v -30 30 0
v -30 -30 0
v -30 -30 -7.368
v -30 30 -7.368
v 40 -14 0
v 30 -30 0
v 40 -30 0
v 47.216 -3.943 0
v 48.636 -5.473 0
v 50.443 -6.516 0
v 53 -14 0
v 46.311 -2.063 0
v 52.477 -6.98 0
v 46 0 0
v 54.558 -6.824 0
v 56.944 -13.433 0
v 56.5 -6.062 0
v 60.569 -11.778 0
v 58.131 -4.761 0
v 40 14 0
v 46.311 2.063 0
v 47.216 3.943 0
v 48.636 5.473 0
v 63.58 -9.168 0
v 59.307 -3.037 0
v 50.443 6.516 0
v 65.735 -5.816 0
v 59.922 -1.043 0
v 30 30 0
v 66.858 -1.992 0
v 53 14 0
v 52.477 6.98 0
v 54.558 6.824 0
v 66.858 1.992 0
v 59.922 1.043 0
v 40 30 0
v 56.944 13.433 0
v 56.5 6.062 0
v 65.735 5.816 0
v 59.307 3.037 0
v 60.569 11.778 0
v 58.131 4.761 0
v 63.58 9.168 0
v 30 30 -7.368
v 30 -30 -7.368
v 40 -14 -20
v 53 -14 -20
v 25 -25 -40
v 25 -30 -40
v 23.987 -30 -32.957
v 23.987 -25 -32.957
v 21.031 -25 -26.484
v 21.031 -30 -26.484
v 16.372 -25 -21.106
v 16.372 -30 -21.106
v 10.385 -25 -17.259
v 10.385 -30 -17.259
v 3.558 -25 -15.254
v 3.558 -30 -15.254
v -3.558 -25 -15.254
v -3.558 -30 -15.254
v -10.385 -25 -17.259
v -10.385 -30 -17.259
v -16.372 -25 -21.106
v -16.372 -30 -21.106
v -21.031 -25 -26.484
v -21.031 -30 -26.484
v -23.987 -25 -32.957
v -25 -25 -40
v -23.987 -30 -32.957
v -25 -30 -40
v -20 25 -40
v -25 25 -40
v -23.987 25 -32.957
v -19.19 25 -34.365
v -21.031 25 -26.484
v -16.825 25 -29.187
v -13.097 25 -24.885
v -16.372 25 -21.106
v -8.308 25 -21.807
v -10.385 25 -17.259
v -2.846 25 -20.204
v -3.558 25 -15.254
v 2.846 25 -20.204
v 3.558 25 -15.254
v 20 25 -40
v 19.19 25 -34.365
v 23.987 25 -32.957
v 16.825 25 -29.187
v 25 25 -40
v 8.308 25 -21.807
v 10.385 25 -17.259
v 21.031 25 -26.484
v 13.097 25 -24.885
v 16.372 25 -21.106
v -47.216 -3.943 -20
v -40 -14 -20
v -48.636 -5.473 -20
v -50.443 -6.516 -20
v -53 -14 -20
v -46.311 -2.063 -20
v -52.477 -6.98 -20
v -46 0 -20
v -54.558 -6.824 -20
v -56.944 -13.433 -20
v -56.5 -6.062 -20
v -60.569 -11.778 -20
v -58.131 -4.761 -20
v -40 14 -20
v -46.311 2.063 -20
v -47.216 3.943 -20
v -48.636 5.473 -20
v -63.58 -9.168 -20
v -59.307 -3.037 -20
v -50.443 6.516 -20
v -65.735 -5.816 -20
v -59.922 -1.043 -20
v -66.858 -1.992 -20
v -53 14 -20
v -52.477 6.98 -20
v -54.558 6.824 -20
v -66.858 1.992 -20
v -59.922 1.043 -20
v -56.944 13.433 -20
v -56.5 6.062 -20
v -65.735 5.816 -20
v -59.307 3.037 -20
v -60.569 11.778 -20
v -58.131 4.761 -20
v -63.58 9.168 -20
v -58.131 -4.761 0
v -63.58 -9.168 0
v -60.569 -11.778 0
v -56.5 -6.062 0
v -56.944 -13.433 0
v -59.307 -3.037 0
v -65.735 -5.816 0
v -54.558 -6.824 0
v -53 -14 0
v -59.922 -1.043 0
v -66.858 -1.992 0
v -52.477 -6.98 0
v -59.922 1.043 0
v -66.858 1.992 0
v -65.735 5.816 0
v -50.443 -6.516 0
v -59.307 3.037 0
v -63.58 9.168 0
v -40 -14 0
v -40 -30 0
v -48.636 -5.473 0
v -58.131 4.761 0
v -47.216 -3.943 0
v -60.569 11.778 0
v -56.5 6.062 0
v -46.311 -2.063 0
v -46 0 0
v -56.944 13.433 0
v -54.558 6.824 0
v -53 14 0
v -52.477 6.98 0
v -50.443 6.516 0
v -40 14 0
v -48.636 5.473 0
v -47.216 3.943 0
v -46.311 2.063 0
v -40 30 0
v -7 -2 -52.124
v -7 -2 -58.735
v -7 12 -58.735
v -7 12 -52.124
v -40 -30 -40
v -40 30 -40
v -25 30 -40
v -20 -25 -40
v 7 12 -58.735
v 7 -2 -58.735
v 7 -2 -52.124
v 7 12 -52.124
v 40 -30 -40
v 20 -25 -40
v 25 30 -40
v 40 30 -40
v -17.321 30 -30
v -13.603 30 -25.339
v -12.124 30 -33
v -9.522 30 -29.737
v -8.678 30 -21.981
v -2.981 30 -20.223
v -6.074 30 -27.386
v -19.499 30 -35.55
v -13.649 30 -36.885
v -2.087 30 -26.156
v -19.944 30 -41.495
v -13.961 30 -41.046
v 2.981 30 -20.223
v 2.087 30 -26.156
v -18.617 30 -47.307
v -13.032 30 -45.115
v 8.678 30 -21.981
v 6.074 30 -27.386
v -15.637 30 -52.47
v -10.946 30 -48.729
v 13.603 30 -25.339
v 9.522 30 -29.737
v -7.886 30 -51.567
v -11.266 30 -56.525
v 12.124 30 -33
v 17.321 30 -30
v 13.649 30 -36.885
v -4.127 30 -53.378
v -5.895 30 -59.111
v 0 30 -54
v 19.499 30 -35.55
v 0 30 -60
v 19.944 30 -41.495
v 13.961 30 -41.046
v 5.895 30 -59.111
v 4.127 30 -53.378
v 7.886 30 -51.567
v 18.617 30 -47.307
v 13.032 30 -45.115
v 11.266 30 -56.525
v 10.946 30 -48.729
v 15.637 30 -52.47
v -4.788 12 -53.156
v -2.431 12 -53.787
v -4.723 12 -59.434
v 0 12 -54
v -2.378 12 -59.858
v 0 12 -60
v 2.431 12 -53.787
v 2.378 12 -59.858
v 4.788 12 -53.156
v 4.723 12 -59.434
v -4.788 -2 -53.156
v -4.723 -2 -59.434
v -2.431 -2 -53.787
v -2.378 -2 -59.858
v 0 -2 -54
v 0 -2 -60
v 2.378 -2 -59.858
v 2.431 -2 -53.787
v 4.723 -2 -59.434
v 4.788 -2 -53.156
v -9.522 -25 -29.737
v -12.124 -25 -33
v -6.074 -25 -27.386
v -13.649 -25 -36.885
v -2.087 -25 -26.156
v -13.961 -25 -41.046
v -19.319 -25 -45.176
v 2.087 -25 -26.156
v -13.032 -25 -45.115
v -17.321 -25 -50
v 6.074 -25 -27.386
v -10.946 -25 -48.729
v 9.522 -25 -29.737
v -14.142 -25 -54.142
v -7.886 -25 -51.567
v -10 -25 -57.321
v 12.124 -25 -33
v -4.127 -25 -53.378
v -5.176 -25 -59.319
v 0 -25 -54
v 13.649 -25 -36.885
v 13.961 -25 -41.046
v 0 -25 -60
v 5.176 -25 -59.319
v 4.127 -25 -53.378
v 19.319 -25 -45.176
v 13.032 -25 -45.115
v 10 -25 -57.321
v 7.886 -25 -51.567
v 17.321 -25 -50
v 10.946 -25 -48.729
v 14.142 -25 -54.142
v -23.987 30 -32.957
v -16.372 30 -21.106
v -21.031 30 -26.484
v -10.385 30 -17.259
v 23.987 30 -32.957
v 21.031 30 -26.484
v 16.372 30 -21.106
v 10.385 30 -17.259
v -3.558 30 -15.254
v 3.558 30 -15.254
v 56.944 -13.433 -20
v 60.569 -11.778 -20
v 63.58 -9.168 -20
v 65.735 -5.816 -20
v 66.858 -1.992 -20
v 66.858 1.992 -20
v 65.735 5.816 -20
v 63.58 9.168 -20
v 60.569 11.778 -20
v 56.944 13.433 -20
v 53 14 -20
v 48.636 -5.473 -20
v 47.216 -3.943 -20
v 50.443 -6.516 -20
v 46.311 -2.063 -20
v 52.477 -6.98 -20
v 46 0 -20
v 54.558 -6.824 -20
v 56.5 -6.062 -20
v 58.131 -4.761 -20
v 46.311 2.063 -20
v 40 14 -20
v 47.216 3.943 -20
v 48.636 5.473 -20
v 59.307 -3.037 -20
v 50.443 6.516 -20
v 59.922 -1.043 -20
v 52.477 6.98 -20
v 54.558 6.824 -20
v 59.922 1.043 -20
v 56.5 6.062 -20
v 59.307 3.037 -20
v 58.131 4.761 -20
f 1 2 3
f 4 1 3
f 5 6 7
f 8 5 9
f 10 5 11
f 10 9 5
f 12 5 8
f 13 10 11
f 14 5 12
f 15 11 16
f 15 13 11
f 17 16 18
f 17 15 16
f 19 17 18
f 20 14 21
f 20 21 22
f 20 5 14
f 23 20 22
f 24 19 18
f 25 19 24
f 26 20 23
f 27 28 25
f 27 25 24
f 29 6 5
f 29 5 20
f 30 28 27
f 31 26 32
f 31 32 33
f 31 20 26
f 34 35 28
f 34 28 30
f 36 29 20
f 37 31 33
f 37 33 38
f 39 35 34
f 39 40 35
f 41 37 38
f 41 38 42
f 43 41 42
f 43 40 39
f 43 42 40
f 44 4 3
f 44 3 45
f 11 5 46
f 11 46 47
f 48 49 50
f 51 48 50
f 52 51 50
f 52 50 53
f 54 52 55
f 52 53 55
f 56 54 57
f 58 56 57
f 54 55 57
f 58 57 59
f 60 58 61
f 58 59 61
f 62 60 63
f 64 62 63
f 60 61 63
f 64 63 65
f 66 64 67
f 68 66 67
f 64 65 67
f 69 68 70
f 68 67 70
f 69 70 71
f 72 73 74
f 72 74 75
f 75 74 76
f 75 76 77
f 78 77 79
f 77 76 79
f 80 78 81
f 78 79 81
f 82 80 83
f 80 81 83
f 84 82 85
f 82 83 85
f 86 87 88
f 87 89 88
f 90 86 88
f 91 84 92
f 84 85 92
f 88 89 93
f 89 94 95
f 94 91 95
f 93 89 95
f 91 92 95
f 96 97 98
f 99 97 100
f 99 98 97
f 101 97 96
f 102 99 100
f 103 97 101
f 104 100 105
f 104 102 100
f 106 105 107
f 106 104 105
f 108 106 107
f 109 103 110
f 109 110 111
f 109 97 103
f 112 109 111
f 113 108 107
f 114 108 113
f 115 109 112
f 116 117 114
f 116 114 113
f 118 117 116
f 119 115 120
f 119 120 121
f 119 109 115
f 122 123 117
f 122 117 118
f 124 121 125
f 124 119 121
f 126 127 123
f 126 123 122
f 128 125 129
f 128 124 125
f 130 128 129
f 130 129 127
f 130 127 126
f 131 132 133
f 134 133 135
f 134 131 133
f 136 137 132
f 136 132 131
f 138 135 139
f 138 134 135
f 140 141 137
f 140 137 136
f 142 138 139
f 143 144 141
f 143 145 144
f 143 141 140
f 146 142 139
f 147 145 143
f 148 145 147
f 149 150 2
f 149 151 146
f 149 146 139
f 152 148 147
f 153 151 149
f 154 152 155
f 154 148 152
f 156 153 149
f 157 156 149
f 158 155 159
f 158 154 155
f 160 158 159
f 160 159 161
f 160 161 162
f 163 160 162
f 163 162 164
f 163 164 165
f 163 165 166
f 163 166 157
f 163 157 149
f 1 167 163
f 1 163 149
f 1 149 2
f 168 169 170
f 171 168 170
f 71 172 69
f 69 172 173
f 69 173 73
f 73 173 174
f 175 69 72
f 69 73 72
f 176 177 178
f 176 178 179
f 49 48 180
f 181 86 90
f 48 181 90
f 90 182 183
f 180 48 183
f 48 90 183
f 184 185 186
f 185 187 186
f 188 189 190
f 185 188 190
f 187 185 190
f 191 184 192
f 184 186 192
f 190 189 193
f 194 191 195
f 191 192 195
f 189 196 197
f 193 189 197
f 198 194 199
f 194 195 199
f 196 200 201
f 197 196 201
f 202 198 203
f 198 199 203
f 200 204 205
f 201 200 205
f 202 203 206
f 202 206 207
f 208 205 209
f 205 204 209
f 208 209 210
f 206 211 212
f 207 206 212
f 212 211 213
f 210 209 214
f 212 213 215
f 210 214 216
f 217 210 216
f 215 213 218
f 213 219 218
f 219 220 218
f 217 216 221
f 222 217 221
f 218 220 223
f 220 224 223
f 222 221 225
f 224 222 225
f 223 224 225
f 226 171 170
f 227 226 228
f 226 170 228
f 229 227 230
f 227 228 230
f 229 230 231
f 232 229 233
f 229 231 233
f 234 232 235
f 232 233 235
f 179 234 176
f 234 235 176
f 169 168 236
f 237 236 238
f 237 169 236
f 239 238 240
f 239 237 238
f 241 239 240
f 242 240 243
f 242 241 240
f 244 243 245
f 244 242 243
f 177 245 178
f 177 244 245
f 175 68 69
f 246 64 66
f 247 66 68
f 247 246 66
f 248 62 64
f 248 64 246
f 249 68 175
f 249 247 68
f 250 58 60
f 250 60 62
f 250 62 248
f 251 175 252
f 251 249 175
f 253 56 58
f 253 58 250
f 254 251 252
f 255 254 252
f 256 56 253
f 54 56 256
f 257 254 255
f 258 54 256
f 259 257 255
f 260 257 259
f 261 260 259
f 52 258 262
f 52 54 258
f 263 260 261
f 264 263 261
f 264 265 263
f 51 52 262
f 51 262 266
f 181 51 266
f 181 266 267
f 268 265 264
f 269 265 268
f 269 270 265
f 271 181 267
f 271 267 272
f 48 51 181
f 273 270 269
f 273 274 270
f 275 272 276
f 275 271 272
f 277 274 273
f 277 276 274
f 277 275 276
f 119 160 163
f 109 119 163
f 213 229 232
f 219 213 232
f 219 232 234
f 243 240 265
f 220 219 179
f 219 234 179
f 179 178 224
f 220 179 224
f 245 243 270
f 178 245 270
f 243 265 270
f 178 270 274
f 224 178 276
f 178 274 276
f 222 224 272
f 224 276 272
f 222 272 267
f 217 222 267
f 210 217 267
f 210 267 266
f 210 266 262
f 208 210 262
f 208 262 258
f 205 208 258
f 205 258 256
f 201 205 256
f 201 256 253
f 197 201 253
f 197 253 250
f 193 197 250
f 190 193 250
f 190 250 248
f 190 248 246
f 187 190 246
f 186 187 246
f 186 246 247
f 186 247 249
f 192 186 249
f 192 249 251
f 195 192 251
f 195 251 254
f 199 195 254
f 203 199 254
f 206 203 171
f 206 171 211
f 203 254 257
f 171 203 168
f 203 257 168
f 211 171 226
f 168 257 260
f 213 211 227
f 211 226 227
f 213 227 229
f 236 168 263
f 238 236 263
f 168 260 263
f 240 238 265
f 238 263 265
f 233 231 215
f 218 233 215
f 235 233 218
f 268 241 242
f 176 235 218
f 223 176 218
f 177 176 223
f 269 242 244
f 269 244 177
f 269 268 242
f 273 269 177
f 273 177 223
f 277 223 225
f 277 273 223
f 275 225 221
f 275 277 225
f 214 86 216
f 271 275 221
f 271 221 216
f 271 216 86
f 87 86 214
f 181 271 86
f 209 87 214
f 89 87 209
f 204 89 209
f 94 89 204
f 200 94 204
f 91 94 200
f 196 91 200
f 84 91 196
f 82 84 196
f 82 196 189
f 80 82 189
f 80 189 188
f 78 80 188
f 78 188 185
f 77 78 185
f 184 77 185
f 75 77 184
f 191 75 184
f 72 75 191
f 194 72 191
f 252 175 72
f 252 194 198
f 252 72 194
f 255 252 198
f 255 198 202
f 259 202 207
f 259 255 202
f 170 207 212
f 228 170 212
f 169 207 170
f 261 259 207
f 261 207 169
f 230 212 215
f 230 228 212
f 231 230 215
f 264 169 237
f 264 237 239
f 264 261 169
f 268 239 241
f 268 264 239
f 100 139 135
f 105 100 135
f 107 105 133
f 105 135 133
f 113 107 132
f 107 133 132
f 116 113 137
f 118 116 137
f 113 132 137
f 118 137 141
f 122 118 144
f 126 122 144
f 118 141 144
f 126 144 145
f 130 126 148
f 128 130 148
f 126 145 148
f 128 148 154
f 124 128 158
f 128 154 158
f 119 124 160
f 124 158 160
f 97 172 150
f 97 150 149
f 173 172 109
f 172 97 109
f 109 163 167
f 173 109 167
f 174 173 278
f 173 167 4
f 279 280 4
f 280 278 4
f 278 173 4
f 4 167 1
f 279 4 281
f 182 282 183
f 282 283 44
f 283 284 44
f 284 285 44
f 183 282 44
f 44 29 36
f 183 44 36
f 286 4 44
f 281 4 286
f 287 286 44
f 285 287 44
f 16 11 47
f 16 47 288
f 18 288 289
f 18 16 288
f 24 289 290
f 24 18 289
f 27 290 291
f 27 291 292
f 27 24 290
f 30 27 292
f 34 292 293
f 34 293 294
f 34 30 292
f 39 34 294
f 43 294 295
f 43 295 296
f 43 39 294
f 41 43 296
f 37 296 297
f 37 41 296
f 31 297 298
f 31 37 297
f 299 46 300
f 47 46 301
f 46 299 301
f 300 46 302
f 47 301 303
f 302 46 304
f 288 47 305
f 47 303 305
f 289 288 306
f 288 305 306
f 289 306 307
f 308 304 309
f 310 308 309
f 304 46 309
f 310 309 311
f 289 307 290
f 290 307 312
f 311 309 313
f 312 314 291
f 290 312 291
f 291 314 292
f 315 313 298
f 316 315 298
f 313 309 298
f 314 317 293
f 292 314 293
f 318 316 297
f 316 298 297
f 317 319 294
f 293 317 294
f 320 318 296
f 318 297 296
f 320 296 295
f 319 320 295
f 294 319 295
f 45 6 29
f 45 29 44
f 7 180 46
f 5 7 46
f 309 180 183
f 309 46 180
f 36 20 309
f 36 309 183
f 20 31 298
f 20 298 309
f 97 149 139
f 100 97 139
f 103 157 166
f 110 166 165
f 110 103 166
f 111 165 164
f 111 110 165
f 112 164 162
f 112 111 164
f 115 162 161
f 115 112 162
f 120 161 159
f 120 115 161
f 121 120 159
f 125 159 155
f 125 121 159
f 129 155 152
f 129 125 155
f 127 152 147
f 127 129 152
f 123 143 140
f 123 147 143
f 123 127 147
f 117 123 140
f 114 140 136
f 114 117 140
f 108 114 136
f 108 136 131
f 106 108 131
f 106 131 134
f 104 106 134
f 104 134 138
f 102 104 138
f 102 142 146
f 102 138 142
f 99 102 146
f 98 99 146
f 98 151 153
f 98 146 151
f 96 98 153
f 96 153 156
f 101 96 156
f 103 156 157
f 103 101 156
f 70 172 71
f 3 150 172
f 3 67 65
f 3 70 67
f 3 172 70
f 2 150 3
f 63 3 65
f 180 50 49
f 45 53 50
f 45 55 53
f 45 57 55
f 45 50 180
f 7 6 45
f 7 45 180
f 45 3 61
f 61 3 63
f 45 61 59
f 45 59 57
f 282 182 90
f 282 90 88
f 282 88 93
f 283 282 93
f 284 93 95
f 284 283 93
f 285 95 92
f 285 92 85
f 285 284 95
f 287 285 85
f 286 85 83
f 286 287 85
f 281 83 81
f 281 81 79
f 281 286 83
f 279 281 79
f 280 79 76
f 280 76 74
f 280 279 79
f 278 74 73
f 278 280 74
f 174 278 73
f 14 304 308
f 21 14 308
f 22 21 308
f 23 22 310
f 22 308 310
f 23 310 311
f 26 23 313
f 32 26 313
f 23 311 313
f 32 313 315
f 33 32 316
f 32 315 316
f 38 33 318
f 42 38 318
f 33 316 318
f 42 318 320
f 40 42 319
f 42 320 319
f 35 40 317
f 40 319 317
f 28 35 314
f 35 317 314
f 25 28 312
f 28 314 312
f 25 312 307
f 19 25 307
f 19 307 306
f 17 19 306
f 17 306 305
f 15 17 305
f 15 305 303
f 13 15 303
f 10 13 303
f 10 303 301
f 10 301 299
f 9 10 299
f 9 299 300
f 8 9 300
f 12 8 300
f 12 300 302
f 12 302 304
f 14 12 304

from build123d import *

# Parameters (mm, degrees)
SKETCH1_W           = 80
SKETCH1_H           = 60
BOSS_EXTRUDE1_DEPTH = 40
SKETCH2_W           = 60
SKETCH2_H           = 7.368056933
CUT_EXTRUDE1_DEPTH  = 83.462112512
BOSS_EXTRUDE2_DEPTH = 20
SKETCH5_R           = 7
CUT_EXTRUDE2_DEPTH  = 77.085478247
SKETCH6_R           = 25
CUT_EXTRUDE3_DEPTH  = 5
SKETCH7_R           = 20
BOSS_EXTRUDE3_DEPTH = 55
SKETCH8_R           = 14
CUT_EXTRUDE4_DEPTH  = 106.422957652
SKETCH11_W          = 14
SKETCH11_H          = 14
CUT_EXTRUDE5_DEPTH  = 10


with BuildPart() as part:
    # Sketch1 → Boss-Extrude1 (new body)
    with BuildSketch(Plane.XY):
        Rectangle(SKETCH1_W, SKETCH1_H)
    extrude(amount=-BOSS_EXTRUDE1_DEPTH)

    # Sketch2 → Cut-Extrude1 (cut, through all)
    with BuildSketch(Plane(origin=(0, 30, 0), x_dir=(1, 0, 0), z_dir=(0, 1, 0))):
        with Locations((0, 3.684028467)):
            Rectangle(SKETCH2_W, SKETCH2_H)
    extrude(amount=-CUT_EXTRUDE1_DEPTH, mode=Mode.SUBTRACT)

    # Sketch4 → Boss-Extrude2 (add)
    with BuildSketch(Plane.XY):
        with BuildLine():
            Line((40, -14), (53, -14))
            ThreePointArc((53, -14), (67, 0), (53, 14))
            Line((53, 14), (40, 14))
            Line((40, 14), (40, -14))
        make_face()
    boss_extrude2 = extrude(amount=-BOSS_EXTRUDE2_DEPTH)

    # Sketch5 → Cut-Extrude2 (cut, through all)
    with BuildSketch(Plane(origin=(0, 0, -20), x_dir=(-1, 0, 0), z_dir=(0, 0, -1))):
        with Locations((-53, 0)):
            Circle(SKETCH5_R)
    cut_extrude2 = extrude(amount=-CUT_EXTRUDE2_DEPTH, mode=Mode.SUBTRACT)

    # Mirror1: Boss-Extrude2, Cut-Extrude2 across plane
    add(boss_extrude2.mirror(Plane(origin=(0, 0, 0), x_dir=(0, 0, 1), z_dir=(1, 0, 0))))
    add(cut_extrude2.mirror(Plane(origin=(0, 0, 0), x_dir=(0, 0, 1), z_dir=(1, 0, 0))), mode=Mode.SUBTRACT)

    # Sketch6 → Cut-Extrude3 (cut)
    with BuildSketch(Plane.XZ.offset(30)):
        with Locations((0, -40)):
            Circle(SKETCH6_R)
    cut_extrude3 = extrude(amount=-CUT_EXTRUDE3_DEPTH, mode=Mode.SUBTRACT)

    # Mirror2: Cut-Extrude3 across plane
    add(cut_extrude3.mirror(Plane.ZX), mode=Mode.SUBTRACT)

    # Sketch7 → Boss-Extrude3 (add, through all)
    with BuildSketch(Plane.XZ.offset(25)):
        with Locations(Location((0, -40, 0), (0, 0, 270))):
            Circle(SKETCH7_R)
    extrude(amount=-BOSS_EXTRUDE3_DEPTH)

    # Sketch8 → Cut-Extrude4 (cut, through all)
    with BuildSketch(Plane.XZ.offset(25)):
        with Locations(Location((0, -40, 0), (0, 0, 270))):
            Circle(SKETCH8_R)
    extrude(amount=-CUT_EXTRUDE4_DEPTH, mode=Mode.SUBTRACT)

    # Sketch11 → Cut-Extrude5 (cut)
    with BuildSketch(Plane.XY.offset(-60)):
        with Locations((0, 5)):
            Rectangle(SKETCH11_W, SKETCH11_H)
    extrude(amount=CUT_EXTRUDE5_DEPTH, mode=Mode.SUBTRACT)


solid = part.part
